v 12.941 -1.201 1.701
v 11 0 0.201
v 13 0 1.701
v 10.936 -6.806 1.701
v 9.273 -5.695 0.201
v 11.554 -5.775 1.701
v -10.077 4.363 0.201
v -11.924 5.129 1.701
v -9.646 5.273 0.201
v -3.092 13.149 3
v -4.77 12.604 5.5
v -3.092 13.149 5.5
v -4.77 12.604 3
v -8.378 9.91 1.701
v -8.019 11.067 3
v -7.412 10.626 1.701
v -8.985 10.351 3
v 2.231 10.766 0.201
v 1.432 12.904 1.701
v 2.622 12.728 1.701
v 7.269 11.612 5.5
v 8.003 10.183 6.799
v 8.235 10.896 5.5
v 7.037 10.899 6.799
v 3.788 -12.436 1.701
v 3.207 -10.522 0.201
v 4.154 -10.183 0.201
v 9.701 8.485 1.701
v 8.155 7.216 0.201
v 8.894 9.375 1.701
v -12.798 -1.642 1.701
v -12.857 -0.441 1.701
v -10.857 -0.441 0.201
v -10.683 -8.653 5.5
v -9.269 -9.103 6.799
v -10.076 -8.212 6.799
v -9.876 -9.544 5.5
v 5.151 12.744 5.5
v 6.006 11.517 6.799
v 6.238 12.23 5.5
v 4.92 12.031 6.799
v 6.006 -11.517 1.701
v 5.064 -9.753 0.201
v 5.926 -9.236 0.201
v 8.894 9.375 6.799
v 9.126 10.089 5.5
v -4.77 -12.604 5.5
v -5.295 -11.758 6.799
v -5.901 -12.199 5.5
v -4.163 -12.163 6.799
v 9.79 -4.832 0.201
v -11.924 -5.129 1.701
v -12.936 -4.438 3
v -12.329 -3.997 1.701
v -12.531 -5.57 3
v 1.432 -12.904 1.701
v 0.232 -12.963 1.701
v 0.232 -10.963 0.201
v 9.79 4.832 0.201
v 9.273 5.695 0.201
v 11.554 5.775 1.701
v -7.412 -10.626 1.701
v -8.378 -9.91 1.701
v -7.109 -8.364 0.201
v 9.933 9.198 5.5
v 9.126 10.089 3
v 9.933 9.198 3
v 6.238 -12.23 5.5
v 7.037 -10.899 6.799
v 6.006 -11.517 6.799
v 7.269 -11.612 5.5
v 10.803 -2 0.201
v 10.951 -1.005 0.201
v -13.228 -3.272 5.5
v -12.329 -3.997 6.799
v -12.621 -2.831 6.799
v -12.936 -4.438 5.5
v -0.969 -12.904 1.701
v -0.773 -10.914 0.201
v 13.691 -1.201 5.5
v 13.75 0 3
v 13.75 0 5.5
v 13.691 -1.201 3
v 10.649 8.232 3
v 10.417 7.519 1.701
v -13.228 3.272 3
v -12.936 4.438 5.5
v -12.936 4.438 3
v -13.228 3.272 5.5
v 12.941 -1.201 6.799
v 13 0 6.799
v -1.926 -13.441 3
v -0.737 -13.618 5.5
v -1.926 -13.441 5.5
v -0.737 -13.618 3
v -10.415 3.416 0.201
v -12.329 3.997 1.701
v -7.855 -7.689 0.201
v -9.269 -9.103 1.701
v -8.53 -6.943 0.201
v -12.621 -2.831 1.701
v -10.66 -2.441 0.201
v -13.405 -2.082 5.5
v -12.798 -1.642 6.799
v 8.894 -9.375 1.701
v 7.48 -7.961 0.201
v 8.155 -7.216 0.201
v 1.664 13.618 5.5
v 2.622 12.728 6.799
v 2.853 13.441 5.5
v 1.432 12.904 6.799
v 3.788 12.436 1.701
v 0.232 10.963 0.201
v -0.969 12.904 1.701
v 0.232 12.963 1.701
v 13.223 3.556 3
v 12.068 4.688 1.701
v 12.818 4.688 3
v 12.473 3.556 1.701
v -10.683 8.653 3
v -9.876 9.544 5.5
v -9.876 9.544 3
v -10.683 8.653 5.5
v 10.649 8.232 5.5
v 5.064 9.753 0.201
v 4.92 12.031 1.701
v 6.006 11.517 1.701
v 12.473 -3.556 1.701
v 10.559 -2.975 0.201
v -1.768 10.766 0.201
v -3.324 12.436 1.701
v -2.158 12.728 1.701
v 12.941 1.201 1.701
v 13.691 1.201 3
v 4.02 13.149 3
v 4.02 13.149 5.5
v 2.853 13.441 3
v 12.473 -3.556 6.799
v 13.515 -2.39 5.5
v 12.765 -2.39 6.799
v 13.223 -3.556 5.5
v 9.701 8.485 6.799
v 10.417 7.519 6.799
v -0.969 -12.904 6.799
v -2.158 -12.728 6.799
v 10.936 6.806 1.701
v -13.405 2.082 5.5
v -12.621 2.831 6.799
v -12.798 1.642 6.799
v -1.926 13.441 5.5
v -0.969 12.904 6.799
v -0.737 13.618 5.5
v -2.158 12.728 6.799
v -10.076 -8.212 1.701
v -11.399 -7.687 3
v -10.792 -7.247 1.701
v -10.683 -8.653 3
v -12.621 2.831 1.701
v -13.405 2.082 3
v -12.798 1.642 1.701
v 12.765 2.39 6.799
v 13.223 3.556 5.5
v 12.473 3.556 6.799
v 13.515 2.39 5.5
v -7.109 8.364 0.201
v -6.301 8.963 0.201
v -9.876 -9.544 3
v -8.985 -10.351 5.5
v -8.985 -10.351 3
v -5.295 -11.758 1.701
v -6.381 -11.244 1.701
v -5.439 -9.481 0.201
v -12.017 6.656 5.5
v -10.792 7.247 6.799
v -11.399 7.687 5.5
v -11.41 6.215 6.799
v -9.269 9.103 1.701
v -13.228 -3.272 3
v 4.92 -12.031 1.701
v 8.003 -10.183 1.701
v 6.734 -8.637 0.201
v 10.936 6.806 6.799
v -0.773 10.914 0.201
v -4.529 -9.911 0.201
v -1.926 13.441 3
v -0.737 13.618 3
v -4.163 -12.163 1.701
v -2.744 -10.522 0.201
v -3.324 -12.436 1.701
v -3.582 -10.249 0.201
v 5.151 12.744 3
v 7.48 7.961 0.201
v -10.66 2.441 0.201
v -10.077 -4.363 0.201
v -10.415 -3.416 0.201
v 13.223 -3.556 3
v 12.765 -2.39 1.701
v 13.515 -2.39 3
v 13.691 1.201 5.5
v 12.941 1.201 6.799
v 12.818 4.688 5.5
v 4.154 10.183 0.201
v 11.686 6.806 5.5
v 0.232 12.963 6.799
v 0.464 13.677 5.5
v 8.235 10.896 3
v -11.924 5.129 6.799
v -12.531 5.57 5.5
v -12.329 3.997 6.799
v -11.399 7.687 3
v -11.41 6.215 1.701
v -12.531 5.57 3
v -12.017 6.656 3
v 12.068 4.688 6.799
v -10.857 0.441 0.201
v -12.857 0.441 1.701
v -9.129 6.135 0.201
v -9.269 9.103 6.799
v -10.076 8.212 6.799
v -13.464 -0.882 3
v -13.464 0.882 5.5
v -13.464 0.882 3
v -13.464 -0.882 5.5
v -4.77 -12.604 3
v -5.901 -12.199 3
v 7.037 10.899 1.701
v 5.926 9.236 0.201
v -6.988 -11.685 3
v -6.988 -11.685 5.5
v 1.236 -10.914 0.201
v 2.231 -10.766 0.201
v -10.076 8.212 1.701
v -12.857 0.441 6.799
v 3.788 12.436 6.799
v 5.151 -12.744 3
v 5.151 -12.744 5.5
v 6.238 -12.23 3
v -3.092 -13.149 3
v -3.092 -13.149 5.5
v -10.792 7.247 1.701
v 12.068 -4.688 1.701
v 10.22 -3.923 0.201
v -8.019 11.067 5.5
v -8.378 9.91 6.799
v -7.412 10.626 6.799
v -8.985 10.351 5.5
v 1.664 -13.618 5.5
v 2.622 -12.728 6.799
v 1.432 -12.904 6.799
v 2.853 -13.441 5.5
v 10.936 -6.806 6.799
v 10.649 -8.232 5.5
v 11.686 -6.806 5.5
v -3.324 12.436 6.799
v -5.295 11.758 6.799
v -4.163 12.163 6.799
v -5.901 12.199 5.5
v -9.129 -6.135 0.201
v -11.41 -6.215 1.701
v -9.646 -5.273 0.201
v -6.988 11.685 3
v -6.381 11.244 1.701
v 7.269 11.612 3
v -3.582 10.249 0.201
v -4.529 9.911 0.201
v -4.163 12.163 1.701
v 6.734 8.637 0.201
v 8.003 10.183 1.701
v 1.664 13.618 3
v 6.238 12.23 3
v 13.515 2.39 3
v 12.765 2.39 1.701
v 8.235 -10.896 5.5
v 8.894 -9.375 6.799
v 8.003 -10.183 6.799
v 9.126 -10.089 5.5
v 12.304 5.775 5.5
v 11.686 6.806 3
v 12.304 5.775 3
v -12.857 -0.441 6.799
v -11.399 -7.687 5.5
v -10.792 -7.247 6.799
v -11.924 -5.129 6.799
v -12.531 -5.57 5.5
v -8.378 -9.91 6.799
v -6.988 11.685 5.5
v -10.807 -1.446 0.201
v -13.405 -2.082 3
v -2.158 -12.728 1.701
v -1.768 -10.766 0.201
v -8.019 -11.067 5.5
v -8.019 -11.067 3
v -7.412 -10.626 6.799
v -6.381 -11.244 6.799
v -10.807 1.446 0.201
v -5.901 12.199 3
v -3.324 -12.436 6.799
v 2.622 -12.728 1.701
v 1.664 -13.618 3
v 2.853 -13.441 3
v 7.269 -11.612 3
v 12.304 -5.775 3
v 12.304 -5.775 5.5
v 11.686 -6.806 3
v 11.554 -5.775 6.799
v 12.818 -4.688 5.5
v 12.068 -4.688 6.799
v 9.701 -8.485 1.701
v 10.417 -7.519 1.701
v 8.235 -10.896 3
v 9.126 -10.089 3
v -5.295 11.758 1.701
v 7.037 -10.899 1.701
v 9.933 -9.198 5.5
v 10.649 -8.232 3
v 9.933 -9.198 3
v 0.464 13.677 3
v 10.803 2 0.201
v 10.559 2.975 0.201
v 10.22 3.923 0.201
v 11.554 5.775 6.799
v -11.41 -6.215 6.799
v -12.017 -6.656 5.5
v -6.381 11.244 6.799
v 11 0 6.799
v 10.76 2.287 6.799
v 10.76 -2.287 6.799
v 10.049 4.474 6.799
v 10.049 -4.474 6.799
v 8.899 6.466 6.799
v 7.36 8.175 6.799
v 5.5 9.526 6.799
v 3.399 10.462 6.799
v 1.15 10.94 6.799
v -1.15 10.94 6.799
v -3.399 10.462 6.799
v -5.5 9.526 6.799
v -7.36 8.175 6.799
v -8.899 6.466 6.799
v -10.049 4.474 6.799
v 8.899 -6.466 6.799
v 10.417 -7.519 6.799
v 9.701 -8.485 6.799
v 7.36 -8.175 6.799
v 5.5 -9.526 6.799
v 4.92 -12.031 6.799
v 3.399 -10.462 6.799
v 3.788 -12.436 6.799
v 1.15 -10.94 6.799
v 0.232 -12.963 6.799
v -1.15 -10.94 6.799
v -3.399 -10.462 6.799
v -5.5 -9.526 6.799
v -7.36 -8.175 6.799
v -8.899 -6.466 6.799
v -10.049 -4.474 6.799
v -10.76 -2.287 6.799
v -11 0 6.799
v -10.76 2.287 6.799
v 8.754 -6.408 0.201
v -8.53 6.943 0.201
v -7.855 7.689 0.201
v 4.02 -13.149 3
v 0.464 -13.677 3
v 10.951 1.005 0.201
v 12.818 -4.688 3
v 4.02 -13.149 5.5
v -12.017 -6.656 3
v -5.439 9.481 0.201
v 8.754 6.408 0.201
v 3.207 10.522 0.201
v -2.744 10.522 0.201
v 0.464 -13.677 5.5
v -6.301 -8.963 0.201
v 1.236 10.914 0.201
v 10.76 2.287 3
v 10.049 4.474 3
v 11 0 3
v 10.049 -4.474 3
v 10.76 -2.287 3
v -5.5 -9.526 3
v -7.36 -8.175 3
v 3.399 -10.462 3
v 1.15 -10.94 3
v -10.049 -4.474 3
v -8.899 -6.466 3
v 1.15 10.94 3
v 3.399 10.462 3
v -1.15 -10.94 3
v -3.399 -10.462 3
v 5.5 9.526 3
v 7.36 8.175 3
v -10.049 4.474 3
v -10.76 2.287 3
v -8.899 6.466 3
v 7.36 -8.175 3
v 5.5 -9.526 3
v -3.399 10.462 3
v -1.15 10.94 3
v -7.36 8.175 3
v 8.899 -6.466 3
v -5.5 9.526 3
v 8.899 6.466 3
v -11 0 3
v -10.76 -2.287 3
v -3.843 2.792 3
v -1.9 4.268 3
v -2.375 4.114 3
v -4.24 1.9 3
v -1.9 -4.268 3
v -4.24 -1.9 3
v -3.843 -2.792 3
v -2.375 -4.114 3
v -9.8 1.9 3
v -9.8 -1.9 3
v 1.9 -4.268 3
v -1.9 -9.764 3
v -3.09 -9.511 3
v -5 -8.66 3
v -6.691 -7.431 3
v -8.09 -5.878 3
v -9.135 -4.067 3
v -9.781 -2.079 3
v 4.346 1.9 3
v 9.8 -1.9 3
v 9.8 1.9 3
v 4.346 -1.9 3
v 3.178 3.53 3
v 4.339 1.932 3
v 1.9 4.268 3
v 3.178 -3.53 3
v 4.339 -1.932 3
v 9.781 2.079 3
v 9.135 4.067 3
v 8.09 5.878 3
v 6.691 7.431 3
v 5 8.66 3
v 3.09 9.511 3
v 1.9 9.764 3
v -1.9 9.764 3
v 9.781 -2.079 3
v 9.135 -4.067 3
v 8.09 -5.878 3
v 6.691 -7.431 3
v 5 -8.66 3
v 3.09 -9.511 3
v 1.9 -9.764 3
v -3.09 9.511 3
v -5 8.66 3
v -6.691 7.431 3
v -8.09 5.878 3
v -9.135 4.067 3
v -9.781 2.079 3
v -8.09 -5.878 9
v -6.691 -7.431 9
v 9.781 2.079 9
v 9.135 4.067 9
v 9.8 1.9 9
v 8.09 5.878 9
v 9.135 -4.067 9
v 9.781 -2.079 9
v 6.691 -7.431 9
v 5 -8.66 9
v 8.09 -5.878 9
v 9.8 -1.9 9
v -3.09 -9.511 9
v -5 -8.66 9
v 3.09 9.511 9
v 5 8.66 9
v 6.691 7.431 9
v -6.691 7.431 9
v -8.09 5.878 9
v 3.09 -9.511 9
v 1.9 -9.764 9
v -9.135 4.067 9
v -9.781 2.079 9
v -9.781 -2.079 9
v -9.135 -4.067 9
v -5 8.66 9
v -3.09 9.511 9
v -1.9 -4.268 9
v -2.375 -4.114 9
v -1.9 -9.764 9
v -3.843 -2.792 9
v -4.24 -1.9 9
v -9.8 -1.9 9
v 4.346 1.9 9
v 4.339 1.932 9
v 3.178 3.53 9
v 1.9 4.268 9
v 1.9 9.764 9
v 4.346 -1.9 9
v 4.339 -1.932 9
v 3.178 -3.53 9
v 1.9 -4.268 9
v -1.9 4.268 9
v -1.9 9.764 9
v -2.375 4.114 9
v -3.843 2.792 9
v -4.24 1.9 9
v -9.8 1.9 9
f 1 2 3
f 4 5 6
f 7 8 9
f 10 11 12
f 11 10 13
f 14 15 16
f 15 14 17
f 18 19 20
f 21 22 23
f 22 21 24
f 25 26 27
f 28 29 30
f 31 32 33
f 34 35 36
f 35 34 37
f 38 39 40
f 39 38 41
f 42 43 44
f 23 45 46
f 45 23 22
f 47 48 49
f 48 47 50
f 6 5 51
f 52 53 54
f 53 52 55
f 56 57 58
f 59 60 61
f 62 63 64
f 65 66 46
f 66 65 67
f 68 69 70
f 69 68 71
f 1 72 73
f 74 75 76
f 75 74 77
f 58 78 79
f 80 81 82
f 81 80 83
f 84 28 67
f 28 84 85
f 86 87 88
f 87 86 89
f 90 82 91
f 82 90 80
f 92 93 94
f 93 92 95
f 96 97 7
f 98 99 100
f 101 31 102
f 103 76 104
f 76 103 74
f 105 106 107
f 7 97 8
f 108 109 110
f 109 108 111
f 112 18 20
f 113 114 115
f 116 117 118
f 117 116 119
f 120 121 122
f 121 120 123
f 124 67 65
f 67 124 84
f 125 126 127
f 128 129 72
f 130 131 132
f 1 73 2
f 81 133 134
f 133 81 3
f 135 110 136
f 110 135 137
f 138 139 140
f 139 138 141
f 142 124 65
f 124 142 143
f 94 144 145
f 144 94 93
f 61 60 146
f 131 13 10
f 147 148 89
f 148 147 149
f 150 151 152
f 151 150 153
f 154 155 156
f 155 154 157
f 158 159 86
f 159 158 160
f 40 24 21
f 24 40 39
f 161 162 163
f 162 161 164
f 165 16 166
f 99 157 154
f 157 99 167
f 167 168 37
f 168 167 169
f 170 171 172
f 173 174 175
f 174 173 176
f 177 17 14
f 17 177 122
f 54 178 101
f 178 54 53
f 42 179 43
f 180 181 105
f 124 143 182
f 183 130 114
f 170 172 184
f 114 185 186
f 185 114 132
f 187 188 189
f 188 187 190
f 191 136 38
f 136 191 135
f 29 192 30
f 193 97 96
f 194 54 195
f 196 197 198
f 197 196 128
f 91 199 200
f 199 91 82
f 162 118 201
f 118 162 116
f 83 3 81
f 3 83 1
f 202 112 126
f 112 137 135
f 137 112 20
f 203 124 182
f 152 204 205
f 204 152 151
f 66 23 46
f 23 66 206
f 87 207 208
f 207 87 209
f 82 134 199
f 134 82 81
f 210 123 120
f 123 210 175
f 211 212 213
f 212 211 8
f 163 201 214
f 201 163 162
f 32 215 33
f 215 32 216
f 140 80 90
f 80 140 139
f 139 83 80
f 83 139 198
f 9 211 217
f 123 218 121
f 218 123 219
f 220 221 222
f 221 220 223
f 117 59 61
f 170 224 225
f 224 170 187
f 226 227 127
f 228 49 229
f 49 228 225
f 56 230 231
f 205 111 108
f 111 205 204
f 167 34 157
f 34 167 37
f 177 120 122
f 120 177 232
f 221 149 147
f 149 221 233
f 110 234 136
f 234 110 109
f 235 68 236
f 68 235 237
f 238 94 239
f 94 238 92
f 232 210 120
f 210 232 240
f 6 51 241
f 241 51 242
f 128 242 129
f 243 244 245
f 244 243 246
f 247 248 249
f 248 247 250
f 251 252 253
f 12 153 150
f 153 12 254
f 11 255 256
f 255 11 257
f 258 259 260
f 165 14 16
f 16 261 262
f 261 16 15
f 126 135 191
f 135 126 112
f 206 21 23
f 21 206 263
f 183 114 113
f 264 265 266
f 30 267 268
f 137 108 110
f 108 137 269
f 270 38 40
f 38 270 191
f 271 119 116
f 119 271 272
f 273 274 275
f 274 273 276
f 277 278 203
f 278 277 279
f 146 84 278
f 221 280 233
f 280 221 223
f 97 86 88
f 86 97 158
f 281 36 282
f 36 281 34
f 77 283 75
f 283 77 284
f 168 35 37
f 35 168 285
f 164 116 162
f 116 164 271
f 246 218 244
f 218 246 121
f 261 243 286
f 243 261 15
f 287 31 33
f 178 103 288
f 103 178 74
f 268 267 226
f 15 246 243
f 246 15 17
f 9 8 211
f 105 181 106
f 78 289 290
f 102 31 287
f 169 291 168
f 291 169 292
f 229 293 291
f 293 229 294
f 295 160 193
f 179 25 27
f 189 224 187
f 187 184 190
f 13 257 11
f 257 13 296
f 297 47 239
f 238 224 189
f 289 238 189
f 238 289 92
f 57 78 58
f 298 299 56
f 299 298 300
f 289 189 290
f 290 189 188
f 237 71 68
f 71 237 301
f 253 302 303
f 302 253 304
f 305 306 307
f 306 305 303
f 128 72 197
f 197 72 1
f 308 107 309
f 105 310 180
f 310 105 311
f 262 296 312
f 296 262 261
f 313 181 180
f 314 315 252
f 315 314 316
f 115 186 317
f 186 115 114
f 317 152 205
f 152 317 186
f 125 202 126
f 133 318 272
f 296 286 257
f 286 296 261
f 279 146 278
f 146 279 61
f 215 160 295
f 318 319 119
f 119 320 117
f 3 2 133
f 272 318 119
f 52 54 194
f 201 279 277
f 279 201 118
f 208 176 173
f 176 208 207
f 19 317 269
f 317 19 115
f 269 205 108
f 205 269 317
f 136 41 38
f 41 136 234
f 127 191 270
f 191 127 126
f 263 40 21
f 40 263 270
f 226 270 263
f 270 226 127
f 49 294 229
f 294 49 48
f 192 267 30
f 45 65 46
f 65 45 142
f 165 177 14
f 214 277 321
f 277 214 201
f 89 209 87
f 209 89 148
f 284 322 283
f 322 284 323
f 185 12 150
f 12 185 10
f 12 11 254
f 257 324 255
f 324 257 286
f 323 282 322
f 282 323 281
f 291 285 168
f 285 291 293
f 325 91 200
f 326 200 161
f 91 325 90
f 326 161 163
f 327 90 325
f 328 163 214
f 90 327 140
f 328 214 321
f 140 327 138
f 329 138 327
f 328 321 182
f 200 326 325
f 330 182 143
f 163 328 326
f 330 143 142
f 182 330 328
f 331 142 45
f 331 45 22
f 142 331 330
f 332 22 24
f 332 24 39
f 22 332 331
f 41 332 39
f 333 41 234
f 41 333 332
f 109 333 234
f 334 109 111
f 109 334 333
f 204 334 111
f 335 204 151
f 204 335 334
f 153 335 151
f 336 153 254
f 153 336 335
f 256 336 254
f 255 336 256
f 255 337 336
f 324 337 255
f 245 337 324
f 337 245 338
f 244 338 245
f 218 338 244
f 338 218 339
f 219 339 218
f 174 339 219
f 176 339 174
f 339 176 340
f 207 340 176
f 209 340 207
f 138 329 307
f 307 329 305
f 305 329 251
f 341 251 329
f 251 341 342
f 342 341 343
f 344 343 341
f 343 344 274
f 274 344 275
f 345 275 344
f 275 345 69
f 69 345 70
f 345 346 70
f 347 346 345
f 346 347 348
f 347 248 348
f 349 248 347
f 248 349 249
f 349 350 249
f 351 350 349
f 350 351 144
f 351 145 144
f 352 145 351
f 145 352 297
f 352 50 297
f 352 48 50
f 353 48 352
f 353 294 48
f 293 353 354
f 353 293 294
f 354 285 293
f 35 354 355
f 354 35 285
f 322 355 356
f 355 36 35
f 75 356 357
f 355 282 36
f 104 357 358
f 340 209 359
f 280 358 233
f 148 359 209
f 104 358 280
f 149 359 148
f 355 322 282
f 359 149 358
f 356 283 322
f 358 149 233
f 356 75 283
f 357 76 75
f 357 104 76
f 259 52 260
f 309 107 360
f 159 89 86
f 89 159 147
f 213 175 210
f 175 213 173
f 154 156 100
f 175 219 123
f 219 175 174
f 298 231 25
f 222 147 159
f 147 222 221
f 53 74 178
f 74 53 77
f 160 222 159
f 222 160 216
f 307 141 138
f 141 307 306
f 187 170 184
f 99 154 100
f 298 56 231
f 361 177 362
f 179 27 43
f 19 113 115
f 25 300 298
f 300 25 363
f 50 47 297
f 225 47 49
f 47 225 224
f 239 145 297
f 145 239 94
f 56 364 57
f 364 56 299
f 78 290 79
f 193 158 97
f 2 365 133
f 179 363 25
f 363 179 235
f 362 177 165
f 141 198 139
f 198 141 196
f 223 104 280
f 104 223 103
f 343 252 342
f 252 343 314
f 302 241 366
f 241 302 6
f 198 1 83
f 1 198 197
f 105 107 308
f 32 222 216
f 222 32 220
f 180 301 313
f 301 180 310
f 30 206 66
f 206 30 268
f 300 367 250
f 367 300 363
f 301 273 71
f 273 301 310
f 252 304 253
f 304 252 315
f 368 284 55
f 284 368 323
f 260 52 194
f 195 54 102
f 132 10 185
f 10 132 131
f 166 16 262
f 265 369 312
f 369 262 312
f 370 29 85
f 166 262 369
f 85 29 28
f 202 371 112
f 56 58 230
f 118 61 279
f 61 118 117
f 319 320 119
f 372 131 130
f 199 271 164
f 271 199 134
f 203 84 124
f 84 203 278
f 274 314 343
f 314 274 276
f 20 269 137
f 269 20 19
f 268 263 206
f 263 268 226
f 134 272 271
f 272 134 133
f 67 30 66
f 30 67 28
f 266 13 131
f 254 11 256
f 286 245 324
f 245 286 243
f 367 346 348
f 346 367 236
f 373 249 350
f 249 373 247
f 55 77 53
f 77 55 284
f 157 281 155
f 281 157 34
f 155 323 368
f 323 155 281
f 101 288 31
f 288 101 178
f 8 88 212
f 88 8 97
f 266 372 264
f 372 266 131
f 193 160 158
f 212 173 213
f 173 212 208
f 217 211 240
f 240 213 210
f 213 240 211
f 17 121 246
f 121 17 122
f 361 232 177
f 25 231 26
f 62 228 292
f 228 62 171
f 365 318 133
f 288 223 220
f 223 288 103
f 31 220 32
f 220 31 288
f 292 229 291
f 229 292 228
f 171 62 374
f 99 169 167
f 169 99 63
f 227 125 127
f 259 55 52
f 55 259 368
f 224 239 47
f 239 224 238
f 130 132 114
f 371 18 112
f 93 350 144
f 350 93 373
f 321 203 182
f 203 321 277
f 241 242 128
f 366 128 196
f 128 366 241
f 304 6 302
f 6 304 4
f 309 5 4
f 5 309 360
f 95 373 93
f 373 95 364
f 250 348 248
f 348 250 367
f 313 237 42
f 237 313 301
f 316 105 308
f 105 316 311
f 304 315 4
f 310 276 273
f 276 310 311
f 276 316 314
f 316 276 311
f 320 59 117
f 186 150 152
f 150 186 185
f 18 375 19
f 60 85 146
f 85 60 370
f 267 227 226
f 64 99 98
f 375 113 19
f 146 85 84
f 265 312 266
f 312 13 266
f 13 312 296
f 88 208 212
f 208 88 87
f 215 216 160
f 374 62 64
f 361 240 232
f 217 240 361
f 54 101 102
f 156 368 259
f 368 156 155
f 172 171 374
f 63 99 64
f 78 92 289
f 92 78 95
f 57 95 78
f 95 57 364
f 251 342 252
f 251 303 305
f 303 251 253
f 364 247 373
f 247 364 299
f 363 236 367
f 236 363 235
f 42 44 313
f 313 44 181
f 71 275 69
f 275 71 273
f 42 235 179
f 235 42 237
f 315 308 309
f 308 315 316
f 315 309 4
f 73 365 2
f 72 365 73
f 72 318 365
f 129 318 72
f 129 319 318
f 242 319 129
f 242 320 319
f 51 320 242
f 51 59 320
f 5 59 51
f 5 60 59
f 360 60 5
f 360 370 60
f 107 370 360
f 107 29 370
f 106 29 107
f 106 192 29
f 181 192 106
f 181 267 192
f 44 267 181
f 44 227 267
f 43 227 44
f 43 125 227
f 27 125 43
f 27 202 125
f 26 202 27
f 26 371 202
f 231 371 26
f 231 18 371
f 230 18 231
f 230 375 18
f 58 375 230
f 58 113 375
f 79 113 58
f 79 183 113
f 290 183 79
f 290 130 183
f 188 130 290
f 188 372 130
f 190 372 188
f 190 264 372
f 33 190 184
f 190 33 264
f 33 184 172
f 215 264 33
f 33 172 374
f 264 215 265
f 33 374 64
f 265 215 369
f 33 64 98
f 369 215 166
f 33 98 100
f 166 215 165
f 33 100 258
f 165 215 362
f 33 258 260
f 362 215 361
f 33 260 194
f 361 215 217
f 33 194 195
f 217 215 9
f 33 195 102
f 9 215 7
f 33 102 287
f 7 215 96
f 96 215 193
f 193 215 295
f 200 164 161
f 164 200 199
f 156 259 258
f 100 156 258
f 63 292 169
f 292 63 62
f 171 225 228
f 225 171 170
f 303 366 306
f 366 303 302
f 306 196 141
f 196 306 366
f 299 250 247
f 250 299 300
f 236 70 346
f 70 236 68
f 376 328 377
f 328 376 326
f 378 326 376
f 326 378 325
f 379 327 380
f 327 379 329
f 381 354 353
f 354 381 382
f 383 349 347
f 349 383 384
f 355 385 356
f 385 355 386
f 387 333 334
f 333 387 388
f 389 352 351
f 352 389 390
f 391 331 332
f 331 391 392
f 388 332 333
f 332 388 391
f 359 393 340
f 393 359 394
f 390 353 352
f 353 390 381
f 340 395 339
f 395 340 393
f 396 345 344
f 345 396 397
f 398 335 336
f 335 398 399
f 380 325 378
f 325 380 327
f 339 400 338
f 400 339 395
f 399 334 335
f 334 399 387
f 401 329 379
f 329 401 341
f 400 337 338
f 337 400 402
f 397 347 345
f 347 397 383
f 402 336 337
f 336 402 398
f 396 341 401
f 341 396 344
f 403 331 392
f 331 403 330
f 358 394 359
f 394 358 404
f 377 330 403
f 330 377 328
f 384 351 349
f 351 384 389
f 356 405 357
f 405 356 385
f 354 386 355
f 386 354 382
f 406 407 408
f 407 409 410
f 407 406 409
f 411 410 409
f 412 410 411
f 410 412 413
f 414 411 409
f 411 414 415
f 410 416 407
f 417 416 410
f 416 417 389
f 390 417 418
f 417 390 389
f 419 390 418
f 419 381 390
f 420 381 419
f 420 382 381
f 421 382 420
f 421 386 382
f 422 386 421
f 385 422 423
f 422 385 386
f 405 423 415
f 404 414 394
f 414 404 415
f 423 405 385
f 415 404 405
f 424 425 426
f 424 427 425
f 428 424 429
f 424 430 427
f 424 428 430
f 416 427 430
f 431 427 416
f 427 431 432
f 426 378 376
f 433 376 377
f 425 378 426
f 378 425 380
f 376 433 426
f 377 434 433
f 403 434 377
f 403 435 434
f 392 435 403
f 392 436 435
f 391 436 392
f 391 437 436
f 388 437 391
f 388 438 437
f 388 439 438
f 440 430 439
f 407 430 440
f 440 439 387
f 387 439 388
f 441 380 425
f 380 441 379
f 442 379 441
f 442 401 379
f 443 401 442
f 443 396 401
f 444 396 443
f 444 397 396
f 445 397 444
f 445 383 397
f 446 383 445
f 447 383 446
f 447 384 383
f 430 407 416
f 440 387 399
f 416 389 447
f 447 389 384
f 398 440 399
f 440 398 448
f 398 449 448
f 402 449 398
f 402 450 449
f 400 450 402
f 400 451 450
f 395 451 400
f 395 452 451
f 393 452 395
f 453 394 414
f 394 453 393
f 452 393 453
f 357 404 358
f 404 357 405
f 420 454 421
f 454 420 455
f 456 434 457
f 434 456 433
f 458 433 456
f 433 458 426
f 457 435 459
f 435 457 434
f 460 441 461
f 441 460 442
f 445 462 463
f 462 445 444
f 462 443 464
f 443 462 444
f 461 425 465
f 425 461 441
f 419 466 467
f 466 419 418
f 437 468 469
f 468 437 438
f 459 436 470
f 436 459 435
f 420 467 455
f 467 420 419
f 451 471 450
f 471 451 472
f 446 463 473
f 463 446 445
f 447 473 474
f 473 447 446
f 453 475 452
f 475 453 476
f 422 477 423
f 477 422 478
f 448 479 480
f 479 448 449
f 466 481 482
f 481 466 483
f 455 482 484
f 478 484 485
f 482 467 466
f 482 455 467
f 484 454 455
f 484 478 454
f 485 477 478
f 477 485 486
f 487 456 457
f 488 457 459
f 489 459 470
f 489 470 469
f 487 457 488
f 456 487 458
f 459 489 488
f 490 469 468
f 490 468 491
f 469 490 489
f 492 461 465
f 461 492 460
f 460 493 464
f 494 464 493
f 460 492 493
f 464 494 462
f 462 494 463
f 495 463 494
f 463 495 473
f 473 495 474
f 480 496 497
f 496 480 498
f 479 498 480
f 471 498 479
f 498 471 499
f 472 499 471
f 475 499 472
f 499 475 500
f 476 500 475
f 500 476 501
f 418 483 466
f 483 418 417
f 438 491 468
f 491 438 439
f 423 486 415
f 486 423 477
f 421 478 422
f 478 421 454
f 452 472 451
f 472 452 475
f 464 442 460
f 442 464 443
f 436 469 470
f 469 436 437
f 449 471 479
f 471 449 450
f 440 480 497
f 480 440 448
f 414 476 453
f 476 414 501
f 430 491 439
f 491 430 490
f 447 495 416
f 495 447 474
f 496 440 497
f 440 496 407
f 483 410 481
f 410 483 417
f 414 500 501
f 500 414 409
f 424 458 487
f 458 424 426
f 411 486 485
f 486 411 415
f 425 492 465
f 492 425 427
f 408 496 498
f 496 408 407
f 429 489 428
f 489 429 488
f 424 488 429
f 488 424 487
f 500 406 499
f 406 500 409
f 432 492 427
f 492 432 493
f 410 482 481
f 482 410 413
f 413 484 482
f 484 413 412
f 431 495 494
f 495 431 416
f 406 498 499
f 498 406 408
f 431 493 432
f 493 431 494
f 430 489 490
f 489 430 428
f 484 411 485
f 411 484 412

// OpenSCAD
d = 22;
t = 1.5;
brim = 2;
brim_h = 4;
shape_fn = 64;
smooth_sphere = 3;
plug_top = brim * 1.5;
plug_h = 6;
plug_w = d - 2 * t;
plug_tight = 1;
plug_hole_d = plug_w * 0.5;

slot_w = plug_w * 0.2;
INF = 999;
cap_d = d + 2 * brim;

difference() {
  minkowski() {
    diff = smooth_sphere / 2;
    translate([ 0, 0, diff ]) hull() {
      cylinder(h = plug_top, d1 = d - diff, d2 = cap_d - diff, $fn = shape_fn);
      translate([ 0, 0, plug_top - diff ])
          cylinder(h = brim_h - diff, d = cap_d - diff, $fn = shape_fn);
    }
    sphere(d = smooth_sphere);
  }

  translate([ 0, 0, plug_top ]) cylinder(h = INF, d = d);
}

module slot(w) cube([ w, INF, INF ], center = true);
// plug
difference() {
  translate([ 0, 0, plug_top ]) cylinder(h = plug_h, d = plug_w + plug_tight);
  slot(slot_w);
  rotate(90) slot(slot_w);
  cylinder(h = INF, d = plug_hole_d);
}
